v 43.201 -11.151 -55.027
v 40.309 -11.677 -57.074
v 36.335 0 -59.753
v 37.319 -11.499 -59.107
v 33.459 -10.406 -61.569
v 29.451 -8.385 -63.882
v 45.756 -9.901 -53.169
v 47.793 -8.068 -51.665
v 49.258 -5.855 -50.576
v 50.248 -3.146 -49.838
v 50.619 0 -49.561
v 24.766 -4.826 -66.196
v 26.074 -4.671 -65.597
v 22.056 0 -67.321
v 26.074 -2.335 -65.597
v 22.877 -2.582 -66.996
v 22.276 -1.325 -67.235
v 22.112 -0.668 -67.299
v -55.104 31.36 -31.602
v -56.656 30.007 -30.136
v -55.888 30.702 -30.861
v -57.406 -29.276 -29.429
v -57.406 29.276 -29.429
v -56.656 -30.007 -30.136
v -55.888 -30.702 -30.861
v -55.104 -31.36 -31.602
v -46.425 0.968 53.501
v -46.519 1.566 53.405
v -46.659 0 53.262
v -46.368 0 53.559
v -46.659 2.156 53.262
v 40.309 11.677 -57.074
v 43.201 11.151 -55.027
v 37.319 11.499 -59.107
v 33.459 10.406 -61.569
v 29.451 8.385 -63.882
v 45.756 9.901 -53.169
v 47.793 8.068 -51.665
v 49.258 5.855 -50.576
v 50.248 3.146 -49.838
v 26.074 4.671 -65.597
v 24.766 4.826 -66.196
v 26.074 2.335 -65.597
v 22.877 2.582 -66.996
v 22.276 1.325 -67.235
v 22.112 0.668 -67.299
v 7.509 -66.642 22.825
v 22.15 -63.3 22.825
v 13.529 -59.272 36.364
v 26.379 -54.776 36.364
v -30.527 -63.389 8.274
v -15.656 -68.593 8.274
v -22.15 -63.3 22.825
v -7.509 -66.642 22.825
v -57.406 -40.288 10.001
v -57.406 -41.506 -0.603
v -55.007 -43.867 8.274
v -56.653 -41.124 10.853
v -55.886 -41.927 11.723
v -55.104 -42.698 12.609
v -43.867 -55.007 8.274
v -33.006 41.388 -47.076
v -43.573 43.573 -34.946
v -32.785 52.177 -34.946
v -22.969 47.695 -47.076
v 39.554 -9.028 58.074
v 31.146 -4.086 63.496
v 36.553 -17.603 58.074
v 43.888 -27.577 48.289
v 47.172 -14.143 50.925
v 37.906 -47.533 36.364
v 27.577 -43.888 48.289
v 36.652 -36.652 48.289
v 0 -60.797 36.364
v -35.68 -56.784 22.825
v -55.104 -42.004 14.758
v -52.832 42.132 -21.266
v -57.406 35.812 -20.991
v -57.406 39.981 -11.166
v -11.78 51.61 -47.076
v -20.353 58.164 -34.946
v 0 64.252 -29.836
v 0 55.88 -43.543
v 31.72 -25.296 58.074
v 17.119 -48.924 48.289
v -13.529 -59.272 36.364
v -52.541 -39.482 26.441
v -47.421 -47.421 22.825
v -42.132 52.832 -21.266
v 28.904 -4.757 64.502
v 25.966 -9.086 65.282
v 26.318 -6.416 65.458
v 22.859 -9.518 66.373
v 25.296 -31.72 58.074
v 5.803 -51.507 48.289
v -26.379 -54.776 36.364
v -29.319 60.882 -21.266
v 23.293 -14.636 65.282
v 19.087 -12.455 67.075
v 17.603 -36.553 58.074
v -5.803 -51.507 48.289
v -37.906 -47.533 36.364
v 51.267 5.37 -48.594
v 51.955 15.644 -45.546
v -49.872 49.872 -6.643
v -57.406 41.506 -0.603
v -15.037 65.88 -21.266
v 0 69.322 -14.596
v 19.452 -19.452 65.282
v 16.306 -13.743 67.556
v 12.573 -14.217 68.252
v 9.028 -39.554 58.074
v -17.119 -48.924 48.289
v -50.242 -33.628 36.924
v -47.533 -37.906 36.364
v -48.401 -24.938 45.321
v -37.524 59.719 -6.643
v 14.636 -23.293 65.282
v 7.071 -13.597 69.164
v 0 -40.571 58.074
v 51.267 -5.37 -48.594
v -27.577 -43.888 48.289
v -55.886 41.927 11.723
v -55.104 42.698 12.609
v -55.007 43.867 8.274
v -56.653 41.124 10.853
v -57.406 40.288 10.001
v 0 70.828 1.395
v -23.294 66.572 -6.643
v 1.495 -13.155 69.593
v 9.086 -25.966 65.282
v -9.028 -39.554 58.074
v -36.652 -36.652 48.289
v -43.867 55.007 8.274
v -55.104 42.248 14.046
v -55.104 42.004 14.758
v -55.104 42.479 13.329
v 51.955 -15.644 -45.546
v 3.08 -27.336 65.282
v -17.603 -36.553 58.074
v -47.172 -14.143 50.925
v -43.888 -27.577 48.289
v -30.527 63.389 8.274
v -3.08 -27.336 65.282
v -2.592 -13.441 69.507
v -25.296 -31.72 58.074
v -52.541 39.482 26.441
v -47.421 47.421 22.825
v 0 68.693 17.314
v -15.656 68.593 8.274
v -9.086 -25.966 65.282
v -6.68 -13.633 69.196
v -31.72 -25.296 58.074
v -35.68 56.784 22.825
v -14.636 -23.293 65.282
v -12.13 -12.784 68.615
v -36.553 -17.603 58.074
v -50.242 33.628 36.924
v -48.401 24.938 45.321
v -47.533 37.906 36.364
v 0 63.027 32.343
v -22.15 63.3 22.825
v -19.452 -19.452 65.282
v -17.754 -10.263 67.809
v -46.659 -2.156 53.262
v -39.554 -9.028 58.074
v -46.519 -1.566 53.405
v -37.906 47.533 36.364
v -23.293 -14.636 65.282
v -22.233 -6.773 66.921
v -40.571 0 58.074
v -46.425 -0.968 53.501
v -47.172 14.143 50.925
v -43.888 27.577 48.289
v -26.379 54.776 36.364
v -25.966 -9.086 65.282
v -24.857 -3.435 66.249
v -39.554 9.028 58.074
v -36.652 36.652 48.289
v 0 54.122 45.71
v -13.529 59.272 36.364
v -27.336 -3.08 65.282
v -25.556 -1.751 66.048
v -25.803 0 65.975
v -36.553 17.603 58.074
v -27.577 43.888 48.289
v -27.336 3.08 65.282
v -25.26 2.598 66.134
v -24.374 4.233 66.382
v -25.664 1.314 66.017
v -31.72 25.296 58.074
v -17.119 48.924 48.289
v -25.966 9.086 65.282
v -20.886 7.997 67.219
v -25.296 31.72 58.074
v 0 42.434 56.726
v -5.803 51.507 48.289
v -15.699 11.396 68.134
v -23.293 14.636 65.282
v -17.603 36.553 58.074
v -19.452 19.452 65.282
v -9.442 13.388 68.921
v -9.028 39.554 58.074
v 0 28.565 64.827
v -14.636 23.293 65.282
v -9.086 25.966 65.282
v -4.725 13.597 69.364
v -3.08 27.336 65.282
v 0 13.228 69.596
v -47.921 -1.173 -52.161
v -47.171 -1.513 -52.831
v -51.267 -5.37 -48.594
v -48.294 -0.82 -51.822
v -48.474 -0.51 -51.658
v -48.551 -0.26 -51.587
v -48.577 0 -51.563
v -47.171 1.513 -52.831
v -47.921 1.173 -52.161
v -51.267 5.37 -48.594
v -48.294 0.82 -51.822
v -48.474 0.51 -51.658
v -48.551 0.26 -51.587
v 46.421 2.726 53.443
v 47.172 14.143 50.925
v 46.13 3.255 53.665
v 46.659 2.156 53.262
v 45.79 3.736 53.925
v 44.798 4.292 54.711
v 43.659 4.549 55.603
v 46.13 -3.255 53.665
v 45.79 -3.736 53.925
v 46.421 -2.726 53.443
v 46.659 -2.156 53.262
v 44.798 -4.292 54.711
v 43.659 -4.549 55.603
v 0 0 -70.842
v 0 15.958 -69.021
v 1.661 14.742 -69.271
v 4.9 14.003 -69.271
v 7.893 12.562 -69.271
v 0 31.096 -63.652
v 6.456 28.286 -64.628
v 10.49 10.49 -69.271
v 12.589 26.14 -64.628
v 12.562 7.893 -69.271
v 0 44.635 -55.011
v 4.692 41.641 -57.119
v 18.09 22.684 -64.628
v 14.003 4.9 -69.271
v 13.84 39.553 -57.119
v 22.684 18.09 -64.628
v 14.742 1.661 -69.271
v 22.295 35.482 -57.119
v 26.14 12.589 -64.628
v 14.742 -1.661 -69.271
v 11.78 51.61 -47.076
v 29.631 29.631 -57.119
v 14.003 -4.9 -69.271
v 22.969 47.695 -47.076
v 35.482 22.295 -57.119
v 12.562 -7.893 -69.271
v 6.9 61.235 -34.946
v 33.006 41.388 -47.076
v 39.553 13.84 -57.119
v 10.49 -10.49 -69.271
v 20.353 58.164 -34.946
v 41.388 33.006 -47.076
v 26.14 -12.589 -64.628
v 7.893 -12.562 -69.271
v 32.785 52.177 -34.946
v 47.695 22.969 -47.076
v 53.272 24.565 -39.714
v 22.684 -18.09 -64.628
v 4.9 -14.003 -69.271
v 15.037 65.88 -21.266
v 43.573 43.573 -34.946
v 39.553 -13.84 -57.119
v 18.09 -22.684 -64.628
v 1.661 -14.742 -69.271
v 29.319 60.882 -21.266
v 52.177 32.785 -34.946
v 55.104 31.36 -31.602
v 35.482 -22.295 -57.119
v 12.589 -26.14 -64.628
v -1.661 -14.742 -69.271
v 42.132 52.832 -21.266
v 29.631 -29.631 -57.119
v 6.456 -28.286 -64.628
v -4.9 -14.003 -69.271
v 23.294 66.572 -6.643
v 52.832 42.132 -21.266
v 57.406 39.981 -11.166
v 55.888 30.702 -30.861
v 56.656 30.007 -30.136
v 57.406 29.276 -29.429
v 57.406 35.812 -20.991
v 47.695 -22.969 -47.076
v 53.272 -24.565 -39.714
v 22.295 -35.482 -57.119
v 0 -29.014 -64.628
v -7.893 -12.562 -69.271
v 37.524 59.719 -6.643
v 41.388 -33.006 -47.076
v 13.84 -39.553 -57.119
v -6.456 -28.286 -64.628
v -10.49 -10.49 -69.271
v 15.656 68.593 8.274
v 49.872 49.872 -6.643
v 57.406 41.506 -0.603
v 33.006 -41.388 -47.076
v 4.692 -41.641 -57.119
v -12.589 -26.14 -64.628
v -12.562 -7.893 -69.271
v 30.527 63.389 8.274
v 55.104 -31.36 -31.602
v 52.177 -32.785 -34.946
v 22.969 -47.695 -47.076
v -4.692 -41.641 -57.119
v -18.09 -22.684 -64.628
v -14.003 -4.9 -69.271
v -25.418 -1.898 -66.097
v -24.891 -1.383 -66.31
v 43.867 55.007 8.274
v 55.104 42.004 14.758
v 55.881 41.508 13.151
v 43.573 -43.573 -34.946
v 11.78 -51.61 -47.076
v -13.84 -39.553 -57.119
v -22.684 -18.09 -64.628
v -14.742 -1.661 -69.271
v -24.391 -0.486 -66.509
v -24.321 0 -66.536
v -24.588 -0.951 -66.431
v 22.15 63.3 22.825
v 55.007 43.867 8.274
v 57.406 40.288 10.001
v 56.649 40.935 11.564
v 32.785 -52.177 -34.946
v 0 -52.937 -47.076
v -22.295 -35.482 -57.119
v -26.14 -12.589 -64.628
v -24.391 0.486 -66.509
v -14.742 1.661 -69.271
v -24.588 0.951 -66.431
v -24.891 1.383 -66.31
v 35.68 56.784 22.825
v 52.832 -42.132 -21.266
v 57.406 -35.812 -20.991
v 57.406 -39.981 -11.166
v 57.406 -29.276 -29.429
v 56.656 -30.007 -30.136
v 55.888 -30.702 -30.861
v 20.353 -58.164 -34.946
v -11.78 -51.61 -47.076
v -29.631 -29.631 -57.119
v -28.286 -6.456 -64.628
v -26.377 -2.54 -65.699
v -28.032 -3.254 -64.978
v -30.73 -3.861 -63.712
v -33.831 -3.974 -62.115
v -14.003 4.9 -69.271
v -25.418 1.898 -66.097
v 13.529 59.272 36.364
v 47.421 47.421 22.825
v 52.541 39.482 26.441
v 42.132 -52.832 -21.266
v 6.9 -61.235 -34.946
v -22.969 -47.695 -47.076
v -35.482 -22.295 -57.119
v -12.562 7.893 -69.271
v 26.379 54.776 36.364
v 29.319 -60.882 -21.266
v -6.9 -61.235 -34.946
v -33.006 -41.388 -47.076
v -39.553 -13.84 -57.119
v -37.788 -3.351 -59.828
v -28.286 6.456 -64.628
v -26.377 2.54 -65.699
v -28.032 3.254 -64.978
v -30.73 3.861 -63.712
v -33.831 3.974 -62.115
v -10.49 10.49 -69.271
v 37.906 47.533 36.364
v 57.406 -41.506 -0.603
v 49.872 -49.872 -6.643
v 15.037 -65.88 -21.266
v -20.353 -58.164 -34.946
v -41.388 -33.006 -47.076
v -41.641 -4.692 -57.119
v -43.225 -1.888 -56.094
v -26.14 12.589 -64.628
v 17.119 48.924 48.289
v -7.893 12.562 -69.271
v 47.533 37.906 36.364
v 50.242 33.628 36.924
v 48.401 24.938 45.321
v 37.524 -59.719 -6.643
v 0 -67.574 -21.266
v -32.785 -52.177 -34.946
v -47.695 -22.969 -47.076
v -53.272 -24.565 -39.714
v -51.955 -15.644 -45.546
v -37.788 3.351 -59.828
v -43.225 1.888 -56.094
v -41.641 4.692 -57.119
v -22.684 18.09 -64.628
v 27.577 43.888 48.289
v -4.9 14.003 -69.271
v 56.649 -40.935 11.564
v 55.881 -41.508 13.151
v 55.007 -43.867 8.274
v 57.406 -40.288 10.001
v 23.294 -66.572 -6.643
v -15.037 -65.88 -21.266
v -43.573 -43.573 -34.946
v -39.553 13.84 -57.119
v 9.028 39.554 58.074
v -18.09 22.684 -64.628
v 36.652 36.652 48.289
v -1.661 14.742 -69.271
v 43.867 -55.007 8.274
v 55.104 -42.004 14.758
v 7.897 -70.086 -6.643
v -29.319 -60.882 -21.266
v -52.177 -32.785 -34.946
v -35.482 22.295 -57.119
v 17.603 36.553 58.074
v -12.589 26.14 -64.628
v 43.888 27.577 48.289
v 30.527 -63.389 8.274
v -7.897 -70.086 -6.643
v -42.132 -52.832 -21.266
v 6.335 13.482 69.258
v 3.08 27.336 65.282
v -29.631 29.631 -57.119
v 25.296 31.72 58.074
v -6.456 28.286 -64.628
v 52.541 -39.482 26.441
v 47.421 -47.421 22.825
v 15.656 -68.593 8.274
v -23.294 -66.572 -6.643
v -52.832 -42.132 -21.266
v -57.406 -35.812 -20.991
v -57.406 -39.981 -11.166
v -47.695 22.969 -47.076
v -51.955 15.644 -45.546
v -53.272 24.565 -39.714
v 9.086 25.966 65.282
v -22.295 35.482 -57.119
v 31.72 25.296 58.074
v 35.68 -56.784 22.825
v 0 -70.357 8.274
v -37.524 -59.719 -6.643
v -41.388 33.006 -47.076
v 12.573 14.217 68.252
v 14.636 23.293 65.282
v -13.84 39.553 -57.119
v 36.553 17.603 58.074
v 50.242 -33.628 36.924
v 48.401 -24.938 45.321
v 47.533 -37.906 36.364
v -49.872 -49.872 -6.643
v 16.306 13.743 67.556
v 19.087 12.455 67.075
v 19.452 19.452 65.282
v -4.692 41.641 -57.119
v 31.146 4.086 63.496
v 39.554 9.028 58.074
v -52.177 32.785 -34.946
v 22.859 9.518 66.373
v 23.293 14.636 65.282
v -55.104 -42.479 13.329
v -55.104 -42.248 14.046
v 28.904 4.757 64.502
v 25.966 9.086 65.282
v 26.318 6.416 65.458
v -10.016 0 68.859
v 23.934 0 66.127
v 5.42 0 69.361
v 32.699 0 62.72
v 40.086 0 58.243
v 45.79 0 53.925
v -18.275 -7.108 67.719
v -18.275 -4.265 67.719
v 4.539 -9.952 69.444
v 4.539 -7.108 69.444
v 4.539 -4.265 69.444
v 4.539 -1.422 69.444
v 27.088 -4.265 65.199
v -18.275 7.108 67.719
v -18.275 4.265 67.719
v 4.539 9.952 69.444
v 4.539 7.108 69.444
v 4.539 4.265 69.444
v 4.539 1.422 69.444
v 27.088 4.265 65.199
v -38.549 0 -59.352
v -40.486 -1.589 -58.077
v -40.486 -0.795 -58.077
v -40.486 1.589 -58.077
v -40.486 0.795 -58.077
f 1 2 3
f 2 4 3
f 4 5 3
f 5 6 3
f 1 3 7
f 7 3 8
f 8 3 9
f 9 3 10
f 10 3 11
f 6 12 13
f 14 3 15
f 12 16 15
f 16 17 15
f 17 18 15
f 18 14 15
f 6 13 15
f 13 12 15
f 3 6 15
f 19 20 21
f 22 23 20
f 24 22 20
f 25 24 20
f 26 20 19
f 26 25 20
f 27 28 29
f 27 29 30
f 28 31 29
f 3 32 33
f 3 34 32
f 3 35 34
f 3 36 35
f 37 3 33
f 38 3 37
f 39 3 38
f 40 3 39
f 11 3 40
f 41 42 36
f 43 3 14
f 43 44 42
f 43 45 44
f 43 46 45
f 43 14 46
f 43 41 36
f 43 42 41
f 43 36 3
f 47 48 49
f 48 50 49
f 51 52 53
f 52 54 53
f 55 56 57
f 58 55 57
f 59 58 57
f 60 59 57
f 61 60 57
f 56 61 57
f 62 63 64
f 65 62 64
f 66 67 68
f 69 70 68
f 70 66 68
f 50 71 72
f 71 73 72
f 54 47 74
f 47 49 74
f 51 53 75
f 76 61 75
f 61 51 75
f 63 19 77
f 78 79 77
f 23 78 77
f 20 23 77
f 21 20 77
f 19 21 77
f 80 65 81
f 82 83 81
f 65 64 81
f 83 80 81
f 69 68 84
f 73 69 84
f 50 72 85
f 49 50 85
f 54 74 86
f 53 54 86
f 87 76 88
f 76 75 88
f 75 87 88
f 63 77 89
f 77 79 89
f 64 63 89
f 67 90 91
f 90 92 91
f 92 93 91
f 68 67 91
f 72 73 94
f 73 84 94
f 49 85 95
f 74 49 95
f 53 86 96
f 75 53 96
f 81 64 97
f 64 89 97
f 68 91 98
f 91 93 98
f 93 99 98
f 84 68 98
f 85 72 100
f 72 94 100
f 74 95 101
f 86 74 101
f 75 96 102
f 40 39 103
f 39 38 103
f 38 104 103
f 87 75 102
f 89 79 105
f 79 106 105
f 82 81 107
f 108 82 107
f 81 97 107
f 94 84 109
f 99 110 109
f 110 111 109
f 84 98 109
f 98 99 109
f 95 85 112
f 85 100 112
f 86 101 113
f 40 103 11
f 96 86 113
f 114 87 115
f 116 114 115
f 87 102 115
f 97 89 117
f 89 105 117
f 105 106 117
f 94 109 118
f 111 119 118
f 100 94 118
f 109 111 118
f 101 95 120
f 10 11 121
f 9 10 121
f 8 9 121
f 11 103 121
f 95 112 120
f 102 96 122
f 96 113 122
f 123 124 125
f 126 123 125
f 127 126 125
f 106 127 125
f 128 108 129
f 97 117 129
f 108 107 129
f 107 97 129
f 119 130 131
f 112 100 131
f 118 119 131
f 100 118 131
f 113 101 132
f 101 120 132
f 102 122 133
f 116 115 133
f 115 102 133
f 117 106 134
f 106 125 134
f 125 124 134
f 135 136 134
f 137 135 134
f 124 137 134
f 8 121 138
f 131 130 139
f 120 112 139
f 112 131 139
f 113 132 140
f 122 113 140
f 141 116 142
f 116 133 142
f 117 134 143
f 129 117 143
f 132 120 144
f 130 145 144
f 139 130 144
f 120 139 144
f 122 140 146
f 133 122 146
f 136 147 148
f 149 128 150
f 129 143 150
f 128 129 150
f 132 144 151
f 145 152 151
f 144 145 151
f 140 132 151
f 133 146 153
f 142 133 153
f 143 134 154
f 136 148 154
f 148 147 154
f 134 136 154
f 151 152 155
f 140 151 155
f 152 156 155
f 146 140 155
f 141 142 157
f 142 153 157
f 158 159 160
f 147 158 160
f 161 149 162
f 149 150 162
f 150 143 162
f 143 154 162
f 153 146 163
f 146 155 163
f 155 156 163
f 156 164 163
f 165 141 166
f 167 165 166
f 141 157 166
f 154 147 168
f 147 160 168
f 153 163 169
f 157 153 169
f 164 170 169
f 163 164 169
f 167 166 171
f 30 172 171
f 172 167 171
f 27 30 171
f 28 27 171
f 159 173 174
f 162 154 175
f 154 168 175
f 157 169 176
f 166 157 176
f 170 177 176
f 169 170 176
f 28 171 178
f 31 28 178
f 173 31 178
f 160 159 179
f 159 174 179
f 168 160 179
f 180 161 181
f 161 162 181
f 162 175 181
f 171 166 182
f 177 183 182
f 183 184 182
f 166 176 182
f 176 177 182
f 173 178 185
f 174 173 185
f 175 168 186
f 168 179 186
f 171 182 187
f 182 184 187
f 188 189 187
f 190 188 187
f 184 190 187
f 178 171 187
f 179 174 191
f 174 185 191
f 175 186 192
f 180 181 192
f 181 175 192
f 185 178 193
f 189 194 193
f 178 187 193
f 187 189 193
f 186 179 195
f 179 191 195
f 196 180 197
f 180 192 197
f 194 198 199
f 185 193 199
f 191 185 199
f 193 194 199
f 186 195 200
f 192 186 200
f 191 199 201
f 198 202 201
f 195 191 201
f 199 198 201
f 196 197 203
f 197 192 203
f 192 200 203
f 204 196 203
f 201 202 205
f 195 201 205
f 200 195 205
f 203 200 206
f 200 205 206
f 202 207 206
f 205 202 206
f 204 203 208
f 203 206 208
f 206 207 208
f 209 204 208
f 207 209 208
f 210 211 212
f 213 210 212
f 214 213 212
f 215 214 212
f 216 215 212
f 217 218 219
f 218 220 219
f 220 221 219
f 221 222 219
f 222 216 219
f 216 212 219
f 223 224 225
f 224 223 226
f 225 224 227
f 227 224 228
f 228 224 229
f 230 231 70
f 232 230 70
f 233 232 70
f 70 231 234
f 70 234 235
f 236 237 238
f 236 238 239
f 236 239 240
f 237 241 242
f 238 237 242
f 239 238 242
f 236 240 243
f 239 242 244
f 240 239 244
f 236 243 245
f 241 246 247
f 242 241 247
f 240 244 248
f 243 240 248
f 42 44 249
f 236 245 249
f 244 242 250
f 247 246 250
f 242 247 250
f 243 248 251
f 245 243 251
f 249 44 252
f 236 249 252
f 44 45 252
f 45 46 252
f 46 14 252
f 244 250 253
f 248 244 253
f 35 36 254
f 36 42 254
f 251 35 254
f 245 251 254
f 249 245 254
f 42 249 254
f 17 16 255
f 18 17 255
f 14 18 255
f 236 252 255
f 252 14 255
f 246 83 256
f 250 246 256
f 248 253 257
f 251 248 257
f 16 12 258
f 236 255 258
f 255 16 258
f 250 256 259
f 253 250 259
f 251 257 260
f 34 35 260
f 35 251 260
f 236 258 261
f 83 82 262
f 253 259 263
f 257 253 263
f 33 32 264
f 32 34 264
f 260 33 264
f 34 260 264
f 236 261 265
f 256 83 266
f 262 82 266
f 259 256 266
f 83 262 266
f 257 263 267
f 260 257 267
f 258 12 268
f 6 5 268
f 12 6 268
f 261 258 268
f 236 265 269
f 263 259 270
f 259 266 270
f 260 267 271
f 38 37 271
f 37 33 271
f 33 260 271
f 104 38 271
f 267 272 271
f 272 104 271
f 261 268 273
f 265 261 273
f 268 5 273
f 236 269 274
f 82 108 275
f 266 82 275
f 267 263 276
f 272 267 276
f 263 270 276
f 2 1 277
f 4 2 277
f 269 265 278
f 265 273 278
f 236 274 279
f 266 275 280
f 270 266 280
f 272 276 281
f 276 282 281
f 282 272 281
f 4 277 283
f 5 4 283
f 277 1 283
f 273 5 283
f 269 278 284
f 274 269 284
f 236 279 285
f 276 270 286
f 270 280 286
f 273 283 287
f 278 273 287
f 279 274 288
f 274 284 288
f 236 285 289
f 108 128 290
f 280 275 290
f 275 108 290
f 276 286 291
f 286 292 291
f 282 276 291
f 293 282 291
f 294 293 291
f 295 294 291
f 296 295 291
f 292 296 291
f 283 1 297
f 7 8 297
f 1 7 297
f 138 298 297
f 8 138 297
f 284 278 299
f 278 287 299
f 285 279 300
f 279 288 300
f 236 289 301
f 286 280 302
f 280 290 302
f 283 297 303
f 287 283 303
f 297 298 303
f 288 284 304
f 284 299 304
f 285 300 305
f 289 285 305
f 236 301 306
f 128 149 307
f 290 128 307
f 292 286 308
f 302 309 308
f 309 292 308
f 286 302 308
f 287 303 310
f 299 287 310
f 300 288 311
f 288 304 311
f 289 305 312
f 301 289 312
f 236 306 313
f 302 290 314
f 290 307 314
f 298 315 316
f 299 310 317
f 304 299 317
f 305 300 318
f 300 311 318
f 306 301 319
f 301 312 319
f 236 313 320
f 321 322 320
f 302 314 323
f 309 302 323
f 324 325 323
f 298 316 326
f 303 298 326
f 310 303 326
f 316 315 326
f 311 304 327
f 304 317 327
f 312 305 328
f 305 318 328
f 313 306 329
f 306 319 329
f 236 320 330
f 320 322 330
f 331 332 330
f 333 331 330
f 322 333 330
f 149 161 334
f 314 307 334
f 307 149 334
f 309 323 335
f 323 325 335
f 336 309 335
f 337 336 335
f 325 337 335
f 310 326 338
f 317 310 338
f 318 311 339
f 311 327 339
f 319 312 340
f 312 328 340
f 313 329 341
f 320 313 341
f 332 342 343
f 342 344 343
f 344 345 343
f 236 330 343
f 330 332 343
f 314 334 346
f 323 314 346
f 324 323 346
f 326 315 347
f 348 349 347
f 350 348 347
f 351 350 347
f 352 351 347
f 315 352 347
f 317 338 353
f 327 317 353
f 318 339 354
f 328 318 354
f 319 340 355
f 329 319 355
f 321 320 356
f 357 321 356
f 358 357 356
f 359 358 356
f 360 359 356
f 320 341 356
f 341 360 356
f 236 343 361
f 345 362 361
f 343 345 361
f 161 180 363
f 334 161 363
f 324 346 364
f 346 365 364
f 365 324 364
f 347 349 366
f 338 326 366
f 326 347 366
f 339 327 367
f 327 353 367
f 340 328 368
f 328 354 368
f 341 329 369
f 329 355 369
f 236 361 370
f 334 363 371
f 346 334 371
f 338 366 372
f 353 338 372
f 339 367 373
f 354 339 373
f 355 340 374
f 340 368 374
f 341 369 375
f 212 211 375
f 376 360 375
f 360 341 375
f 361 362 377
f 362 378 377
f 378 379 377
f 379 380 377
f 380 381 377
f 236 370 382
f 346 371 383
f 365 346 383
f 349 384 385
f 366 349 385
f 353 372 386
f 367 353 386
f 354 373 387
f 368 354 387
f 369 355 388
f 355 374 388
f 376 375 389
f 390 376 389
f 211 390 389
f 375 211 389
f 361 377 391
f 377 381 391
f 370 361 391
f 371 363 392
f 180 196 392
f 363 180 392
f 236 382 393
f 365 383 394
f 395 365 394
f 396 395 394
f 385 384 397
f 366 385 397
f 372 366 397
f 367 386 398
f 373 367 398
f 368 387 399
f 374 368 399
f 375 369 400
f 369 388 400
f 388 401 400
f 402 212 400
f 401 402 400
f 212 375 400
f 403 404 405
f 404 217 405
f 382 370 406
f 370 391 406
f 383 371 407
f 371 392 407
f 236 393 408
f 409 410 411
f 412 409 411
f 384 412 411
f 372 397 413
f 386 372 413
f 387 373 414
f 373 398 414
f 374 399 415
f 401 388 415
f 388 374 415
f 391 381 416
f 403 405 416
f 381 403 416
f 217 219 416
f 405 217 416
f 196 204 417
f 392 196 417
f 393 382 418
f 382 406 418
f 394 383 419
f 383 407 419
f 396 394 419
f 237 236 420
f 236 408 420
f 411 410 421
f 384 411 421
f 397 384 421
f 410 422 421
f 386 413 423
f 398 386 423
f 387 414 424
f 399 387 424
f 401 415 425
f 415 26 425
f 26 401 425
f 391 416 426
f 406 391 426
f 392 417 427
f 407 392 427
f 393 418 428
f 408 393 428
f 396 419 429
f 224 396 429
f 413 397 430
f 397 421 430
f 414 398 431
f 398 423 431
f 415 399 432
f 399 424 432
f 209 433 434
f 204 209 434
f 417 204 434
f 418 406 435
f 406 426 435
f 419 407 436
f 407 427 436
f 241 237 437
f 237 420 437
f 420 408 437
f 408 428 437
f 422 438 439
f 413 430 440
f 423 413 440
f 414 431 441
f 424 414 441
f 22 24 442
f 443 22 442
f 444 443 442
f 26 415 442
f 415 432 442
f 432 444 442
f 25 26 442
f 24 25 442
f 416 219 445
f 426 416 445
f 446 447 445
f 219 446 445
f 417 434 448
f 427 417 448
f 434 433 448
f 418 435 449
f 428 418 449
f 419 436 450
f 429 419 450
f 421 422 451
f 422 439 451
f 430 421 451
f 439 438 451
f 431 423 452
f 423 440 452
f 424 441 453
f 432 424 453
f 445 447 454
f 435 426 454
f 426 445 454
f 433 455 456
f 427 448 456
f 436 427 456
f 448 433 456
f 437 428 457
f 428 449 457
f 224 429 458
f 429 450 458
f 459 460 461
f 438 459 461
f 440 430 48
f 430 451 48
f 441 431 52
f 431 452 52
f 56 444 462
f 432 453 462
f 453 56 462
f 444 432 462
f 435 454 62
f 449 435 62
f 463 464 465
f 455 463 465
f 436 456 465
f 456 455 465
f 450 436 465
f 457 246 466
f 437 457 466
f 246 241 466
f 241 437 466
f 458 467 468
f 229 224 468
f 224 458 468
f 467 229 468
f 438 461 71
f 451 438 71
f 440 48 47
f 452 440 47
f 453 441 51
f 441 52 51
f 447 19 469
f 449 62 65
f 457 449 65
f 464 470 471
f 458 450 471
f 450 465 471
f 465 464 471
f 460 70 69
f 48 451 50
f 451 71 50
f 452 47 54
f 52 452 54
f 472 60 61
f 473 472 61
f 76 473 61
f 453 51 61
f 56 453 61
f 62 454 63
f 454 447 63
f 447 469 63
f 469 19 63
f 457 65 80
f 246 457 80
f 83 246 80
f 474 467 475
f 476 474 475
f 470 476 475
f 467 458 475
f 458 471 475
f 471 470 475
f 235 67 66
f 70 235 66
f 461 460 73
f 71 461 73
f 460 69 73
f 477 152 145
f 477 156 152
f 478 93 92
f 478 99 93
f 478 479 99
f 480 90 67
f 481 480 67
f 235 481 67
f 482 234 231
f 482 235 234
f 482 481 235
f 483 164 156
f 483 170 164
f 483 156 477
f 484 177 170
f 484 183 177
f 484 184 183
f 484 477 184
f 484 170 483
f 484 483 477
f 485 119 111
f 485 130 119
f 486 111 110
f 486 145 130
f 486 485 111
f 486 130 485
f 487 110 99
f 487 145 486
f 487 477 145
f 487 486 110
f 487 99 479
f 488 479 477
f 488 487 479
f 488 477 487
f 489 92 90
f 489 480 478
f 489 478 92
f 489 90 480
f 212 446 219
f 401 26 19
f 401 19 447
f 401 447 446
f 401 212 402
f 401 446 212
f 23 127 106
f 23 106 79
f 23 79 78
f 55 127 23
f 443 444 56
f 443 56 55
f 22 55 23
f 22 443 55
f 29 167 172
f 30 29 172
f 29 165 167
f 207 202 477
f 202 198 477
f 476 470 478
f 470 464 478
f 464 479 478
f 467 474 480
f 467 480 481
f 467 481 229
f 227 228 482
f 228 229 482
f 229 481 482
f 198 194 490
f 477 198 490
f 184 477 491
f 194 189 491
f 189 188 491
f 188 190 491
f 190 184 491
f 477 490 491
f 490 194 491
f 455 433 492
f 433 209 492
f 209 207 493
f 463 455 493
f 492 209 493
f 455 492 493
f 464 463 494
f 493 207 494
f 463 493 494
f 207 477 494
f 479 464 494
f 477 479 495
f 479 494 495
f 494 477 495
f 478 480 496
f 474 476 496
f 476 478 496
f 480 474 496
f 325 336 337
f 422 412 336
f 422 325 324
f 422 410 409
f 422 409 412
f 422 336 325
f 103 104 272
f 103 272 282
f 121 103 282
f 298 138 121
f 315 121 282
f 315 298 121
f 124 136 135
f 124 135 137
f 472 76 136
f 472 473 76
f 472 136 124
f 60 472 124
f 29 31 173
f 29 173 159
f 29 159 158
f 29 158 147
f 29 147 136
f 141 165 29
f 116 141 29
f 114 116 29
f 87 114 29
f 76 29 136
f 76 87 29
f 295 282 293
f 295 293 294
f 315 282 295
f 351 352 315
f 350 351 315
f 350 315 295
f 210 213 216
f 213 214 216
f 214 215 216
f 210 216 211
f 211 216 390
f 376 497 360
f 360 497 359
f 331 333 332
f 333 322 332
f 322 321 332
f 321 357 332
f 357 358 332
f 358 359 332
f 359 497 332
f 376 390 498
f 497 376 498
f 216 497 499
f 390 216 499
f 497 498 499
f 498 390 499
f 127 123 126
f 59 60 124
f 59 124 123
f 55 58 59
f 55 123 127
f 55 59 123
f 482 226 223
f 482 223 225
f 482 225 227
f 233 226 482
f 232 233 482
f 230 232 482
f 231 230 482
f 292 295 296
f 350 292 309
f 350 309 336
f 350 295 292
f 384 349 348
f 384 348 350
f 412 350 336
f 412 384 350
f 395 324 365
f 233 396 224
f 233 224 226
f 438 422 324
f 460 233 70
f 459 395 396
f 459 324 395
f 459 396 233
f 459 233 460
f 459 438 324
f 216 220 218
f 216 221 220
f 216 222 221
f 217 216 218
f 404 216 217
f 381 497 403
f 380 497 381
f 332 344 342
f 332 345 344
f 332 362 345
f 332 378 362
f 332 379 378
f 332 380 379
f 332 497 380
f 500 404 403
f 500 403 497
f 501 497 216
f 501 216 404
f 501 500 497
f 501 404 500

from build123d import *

# Parameters (mm, degrees)
F3_DEPTH = 88.138


with BuildPart() as f1:
    # F0 (on Right) → F1 (revolve)
    with BuildSketch(Plane.YZ):
        with BuildLine():
            Line((0, 70.8416298213), (0, -70.8416298213))
            ThreePointArc((0, -70.8416298213), (70.8416298213, 0), (0, 70.8416298213))
        make_face()
    revolve(axis=Axis((0, 0, 0), (0, 0, -1)))

    # F2 (on Front) → F3 (intersect, symmetric)
    with BuildSketch(Plane.XZ):
        with BuildLine():
            add(Edge.make_bspline(
                [(-46.6592088342, 53.2616898417), (-45.4183797693, 54.5278978273), (-42.6869236647, 57.3152209406), (-36.2931747251, 62.1716157185), (-26.9719798216, 65.8489474918), (-18.3180072339, 67.9057468895), (-6.7062624568, 69.3009329626), (4.4643194234, 70.0168470256), (16.9701926515, 67.2645644417), (27.1342814823, 65.9736427336), (38.7911737808, 59.4801067729), (43.6075364693, 55.6569433468), (45.7895621657, 53.9248809218)],
                knots=[0, 0, 0, 0, 0.0747817838, 0.1646182908, 0.2647754033, 0.36017978, 0.4679768944, 0.5753520805, 0.6877157242, 0.7905193986, 0.9050960061, 1, 1, 1, 1], degree=3))
            Line((-46.6592088342, 53.2616898417), (-55.1035441458, 14.7579303011))
            Line((-55.1035441458, 14.7579303011), (-55.1035441458, 12.6094166189))
            Line((-55.1035441458, 12.6094166189), (-57.4055202305, 10.0005073473))
            Line((-57.4055202305, 10.0005073473), (-57.4055202305, -29.4290501624))
            Line((-57.4055202305, -29.4290501624), (-55.1035441458, -31.6015295684))
            Line((-55.1035441458, -31.6015295684), (-51.1359348893, -49.1747111082))
            add(Edge.make_bspline(
                [(-51.1359348893, -49.1747111082), (-47.9992454957, -52.1301607476), (-40.7561015524, -58.9547915828), (-19.1287563078, -69.9086773355), (4.1850416995, -72.4466384159), (27.1525670282, -67.080206471), (42.7802476894, -55.4128974746), (51.1359348893, -49.1747111082)],
                knots=[0, 0, 0, 0, 0.15742802, 0.3635278048, 0.5674104782, 0.7687063865, 1, 1, 1, 1], degree=3))
            Line((51.1359348893, -49.1747111082), (55.1035441458, -31.6015295684))
            Line((55.1035441458, -31.6015295684), (57.4055202305, -29.4290501624))
            Line((57.4055202305, -29.4290501624), (57.4055202305, 10.0005073473))
            Line((57.4055202305, 10.0005073473), (55.1035441458, 14.7579303011))
            Line((55.1035441458, 14.7579303011), (46.6592088342, 53.2616898417))
            Line((46.6592088342, 53.2616898417), (45.7895621657, 53.9248809218))
        make_face()
    extrude(amount=F3_DEPTH, both=True, mode=Mode.INTERSECT)


solid = f1.part
